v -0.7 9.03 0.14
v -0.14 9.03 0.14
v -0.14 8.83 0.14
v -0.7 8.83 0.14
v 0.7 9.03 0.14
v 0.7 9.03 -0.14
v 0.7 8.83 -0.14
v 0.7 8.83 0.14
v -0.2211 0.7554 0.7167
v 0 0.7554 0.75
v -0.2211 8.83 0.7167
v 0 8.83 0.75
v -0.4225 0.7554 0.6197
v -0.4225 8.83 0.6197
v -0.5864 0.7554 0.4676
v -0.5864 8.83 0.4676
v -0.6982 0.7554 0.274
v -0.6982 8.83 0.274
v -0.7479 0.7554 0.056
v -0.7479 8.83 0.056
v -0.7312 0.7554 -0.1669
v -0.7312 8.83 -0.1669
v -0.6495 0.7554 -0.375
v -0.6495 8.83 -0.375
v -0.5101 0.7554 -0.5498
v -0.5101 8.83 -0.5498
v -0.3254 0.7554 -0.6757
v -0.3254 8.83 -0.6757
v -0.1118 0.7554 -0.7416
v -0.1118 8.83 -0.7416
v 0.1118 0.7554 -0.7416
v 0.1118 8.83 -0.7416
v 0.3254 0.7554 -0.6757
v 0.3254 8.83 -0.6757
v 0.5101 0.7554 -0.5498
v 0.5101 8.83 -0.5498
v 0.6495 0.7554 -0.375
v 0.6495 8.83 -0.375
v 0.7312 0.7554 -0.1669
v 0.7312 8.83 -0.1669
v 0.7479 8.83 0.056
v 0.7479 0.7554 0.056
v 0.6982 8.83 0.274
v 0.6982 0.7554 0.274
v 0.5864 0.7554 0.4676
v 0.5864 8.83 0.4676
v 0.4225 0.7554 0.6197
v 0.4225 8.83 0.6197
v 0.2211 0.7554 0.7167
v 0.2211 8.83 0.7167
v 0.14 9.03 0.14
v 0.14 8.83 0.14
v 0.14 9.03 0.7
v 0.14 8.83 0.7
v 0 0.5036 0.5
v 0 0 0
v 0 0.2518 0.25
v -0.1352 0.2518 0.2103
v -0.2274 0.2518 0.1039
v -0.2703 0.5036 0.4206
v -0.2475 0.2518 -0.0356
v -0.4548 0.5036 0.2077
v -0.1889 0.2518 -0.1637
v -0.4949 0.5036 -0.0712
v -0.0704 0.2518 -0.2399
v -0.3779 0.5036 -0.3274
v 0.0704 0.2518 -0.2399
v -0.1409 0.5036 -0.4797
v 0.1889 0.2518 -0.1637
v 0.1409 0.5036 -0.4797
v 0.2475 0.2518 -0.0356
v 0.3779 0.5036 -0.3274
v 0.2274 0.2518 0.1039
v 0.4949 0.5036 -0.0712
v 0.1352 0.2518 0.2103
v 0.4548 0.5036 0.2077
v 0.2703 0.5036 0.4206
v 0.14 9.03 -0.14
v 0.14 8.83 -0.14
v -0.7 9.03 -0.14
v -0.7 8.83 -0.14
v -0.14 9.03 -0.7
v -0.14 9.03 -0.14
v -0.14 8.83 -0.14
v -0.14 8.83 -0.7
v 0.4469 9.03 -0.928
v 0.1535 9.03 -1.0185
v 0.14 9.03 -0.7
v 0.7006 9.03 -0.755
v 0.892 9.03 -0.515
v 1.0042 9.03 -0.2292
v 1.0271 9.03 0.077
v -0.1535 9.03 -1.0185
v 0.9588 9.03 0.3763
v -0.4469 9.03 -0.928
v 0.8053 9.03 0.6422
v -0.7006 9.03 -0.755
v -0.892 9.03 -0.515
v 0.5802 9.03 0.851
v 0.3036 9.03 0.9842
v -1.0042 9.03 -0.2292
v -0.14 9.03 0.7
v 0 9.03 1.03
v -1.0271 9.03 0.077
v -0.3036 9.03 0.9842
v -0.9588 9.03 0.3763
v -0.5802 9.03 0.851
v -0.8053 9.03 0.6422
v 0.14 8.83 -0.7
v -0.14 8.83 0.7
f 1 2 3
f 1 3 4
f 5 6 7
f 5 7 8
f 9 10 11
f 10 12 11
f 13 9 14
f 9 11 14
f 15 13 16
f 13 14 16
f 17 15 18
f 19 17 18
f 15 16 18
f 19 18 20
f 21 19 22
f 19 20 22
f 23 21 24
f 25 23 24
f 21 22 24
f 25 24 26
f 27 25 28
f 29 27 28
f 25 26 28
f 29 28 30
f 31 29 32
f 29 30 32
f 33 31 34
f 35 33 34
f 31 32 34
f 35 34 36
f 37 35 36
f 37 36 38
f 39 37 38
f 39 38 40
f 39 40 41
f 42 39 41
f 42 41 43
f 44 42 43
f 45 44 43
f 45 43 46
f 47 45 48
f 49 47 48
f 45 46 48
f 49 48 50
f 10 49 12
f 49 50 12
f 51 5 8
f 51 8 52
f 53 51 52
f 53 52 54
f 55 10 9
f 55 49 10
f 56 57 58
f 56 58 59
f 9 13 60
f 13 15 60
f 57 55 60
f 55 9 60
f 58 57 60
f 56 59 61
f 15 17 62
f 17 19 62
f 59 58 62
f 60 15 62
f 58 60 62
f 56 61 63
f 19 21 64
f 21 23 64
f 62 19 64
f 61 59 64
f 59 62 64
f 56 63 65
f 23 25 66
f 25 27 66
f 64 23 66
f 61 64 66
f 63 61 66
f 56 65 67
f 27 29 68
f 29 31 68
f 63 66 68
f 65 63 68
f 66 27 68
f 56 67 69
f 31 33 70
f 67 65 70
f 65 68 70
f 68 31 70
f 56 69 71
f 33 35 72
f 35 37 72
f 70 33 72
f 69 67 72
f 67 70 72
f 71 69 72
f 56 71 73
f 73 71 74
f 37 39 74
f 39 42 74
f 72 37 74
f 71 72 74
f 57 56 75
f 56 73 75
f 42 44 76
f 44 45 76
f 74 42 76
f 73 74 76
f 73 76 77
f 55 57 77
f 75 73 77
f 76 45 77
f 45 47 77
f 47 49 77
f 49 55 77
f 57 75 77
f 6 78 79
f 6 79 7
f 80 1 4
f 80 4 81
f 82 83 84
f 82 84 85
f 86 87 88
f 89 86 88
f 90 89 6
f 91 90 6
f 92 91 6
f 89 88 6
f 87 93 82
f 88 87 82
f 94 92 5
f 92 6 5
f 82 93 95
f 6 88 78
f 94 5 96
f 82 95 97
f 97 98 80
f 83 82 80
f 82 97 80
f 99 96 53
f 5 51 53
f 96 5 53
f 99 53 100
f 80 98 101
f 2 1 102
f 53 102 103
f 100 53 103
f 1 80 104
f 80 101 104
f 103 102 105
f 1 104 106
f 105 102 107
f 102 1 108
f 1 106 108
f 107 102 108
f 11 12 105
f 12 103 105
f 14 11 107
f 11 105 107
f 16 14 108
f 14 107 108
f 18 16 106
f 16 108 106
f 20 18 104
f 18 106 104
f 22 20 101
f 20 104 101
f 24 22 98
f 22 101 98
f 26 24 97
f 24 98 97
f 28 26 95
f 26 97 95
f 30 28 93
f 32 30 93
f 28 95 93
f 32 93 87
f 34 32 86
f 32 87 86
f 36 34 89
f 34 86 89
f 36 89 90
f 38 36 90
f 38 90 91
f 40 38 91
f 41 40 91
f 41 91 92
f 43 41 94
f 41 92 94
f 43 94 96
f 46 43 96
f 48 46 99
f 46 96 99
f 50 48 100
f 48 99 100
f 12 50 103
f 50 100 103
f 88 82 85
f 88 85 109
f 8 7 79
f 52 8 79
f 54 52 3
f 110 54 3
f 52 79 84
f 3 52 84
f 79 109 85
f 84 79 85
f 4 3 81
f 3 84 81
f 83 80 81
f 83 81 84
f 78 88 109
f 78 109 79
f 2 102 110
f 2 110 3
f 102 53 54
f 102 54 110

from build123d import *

# Parameters (mm, degrees)
CUT_EXTRUDE1_DEPTH = 0.2


with BuildPart() as part:
    # Sketch1 → Revolve1 (revolve)
    with BuildSketch(Plane.XY, mode=Mode.PRIVATE) as revolve1_sk:
        Polygon((0, 0), (0.75, 0.755428016), (0.75, 8.83), (1.03, 9.03), (0, 9.03), align=None)
    revolve(revolve1_sk.sketch.rotate(Axis((0, 12.912548638, 0), (0, -1, 0)), 90), axis=Axis((0, 12.912548638, 0), (0, -1, 0)))

    # Sketch2 → Cut-Extrude1 (cut)
    with BuildSketch(Plane(origin=(0, 9.03, 0), x_dir=(1, 0, 0), z_dir=(0, 1, 0))):
        Polygon((-0.14, 0.14), (-0.14, 0.7), (0.14, 0.7), (0.14, 0.14), (0.7, 0.14), (0.7, -0.14), (0.14, -0.14), (0.14, -0.7), (-0.14, -0.7), (-0.14, -0.14), (-0.7, -0.14), (-0.7, 0.14), align=None)
    extrude(amount=-CUT_EXTRUDE1_DEPTH, mode=Mode.SUBTRACT)


solid = part.part
